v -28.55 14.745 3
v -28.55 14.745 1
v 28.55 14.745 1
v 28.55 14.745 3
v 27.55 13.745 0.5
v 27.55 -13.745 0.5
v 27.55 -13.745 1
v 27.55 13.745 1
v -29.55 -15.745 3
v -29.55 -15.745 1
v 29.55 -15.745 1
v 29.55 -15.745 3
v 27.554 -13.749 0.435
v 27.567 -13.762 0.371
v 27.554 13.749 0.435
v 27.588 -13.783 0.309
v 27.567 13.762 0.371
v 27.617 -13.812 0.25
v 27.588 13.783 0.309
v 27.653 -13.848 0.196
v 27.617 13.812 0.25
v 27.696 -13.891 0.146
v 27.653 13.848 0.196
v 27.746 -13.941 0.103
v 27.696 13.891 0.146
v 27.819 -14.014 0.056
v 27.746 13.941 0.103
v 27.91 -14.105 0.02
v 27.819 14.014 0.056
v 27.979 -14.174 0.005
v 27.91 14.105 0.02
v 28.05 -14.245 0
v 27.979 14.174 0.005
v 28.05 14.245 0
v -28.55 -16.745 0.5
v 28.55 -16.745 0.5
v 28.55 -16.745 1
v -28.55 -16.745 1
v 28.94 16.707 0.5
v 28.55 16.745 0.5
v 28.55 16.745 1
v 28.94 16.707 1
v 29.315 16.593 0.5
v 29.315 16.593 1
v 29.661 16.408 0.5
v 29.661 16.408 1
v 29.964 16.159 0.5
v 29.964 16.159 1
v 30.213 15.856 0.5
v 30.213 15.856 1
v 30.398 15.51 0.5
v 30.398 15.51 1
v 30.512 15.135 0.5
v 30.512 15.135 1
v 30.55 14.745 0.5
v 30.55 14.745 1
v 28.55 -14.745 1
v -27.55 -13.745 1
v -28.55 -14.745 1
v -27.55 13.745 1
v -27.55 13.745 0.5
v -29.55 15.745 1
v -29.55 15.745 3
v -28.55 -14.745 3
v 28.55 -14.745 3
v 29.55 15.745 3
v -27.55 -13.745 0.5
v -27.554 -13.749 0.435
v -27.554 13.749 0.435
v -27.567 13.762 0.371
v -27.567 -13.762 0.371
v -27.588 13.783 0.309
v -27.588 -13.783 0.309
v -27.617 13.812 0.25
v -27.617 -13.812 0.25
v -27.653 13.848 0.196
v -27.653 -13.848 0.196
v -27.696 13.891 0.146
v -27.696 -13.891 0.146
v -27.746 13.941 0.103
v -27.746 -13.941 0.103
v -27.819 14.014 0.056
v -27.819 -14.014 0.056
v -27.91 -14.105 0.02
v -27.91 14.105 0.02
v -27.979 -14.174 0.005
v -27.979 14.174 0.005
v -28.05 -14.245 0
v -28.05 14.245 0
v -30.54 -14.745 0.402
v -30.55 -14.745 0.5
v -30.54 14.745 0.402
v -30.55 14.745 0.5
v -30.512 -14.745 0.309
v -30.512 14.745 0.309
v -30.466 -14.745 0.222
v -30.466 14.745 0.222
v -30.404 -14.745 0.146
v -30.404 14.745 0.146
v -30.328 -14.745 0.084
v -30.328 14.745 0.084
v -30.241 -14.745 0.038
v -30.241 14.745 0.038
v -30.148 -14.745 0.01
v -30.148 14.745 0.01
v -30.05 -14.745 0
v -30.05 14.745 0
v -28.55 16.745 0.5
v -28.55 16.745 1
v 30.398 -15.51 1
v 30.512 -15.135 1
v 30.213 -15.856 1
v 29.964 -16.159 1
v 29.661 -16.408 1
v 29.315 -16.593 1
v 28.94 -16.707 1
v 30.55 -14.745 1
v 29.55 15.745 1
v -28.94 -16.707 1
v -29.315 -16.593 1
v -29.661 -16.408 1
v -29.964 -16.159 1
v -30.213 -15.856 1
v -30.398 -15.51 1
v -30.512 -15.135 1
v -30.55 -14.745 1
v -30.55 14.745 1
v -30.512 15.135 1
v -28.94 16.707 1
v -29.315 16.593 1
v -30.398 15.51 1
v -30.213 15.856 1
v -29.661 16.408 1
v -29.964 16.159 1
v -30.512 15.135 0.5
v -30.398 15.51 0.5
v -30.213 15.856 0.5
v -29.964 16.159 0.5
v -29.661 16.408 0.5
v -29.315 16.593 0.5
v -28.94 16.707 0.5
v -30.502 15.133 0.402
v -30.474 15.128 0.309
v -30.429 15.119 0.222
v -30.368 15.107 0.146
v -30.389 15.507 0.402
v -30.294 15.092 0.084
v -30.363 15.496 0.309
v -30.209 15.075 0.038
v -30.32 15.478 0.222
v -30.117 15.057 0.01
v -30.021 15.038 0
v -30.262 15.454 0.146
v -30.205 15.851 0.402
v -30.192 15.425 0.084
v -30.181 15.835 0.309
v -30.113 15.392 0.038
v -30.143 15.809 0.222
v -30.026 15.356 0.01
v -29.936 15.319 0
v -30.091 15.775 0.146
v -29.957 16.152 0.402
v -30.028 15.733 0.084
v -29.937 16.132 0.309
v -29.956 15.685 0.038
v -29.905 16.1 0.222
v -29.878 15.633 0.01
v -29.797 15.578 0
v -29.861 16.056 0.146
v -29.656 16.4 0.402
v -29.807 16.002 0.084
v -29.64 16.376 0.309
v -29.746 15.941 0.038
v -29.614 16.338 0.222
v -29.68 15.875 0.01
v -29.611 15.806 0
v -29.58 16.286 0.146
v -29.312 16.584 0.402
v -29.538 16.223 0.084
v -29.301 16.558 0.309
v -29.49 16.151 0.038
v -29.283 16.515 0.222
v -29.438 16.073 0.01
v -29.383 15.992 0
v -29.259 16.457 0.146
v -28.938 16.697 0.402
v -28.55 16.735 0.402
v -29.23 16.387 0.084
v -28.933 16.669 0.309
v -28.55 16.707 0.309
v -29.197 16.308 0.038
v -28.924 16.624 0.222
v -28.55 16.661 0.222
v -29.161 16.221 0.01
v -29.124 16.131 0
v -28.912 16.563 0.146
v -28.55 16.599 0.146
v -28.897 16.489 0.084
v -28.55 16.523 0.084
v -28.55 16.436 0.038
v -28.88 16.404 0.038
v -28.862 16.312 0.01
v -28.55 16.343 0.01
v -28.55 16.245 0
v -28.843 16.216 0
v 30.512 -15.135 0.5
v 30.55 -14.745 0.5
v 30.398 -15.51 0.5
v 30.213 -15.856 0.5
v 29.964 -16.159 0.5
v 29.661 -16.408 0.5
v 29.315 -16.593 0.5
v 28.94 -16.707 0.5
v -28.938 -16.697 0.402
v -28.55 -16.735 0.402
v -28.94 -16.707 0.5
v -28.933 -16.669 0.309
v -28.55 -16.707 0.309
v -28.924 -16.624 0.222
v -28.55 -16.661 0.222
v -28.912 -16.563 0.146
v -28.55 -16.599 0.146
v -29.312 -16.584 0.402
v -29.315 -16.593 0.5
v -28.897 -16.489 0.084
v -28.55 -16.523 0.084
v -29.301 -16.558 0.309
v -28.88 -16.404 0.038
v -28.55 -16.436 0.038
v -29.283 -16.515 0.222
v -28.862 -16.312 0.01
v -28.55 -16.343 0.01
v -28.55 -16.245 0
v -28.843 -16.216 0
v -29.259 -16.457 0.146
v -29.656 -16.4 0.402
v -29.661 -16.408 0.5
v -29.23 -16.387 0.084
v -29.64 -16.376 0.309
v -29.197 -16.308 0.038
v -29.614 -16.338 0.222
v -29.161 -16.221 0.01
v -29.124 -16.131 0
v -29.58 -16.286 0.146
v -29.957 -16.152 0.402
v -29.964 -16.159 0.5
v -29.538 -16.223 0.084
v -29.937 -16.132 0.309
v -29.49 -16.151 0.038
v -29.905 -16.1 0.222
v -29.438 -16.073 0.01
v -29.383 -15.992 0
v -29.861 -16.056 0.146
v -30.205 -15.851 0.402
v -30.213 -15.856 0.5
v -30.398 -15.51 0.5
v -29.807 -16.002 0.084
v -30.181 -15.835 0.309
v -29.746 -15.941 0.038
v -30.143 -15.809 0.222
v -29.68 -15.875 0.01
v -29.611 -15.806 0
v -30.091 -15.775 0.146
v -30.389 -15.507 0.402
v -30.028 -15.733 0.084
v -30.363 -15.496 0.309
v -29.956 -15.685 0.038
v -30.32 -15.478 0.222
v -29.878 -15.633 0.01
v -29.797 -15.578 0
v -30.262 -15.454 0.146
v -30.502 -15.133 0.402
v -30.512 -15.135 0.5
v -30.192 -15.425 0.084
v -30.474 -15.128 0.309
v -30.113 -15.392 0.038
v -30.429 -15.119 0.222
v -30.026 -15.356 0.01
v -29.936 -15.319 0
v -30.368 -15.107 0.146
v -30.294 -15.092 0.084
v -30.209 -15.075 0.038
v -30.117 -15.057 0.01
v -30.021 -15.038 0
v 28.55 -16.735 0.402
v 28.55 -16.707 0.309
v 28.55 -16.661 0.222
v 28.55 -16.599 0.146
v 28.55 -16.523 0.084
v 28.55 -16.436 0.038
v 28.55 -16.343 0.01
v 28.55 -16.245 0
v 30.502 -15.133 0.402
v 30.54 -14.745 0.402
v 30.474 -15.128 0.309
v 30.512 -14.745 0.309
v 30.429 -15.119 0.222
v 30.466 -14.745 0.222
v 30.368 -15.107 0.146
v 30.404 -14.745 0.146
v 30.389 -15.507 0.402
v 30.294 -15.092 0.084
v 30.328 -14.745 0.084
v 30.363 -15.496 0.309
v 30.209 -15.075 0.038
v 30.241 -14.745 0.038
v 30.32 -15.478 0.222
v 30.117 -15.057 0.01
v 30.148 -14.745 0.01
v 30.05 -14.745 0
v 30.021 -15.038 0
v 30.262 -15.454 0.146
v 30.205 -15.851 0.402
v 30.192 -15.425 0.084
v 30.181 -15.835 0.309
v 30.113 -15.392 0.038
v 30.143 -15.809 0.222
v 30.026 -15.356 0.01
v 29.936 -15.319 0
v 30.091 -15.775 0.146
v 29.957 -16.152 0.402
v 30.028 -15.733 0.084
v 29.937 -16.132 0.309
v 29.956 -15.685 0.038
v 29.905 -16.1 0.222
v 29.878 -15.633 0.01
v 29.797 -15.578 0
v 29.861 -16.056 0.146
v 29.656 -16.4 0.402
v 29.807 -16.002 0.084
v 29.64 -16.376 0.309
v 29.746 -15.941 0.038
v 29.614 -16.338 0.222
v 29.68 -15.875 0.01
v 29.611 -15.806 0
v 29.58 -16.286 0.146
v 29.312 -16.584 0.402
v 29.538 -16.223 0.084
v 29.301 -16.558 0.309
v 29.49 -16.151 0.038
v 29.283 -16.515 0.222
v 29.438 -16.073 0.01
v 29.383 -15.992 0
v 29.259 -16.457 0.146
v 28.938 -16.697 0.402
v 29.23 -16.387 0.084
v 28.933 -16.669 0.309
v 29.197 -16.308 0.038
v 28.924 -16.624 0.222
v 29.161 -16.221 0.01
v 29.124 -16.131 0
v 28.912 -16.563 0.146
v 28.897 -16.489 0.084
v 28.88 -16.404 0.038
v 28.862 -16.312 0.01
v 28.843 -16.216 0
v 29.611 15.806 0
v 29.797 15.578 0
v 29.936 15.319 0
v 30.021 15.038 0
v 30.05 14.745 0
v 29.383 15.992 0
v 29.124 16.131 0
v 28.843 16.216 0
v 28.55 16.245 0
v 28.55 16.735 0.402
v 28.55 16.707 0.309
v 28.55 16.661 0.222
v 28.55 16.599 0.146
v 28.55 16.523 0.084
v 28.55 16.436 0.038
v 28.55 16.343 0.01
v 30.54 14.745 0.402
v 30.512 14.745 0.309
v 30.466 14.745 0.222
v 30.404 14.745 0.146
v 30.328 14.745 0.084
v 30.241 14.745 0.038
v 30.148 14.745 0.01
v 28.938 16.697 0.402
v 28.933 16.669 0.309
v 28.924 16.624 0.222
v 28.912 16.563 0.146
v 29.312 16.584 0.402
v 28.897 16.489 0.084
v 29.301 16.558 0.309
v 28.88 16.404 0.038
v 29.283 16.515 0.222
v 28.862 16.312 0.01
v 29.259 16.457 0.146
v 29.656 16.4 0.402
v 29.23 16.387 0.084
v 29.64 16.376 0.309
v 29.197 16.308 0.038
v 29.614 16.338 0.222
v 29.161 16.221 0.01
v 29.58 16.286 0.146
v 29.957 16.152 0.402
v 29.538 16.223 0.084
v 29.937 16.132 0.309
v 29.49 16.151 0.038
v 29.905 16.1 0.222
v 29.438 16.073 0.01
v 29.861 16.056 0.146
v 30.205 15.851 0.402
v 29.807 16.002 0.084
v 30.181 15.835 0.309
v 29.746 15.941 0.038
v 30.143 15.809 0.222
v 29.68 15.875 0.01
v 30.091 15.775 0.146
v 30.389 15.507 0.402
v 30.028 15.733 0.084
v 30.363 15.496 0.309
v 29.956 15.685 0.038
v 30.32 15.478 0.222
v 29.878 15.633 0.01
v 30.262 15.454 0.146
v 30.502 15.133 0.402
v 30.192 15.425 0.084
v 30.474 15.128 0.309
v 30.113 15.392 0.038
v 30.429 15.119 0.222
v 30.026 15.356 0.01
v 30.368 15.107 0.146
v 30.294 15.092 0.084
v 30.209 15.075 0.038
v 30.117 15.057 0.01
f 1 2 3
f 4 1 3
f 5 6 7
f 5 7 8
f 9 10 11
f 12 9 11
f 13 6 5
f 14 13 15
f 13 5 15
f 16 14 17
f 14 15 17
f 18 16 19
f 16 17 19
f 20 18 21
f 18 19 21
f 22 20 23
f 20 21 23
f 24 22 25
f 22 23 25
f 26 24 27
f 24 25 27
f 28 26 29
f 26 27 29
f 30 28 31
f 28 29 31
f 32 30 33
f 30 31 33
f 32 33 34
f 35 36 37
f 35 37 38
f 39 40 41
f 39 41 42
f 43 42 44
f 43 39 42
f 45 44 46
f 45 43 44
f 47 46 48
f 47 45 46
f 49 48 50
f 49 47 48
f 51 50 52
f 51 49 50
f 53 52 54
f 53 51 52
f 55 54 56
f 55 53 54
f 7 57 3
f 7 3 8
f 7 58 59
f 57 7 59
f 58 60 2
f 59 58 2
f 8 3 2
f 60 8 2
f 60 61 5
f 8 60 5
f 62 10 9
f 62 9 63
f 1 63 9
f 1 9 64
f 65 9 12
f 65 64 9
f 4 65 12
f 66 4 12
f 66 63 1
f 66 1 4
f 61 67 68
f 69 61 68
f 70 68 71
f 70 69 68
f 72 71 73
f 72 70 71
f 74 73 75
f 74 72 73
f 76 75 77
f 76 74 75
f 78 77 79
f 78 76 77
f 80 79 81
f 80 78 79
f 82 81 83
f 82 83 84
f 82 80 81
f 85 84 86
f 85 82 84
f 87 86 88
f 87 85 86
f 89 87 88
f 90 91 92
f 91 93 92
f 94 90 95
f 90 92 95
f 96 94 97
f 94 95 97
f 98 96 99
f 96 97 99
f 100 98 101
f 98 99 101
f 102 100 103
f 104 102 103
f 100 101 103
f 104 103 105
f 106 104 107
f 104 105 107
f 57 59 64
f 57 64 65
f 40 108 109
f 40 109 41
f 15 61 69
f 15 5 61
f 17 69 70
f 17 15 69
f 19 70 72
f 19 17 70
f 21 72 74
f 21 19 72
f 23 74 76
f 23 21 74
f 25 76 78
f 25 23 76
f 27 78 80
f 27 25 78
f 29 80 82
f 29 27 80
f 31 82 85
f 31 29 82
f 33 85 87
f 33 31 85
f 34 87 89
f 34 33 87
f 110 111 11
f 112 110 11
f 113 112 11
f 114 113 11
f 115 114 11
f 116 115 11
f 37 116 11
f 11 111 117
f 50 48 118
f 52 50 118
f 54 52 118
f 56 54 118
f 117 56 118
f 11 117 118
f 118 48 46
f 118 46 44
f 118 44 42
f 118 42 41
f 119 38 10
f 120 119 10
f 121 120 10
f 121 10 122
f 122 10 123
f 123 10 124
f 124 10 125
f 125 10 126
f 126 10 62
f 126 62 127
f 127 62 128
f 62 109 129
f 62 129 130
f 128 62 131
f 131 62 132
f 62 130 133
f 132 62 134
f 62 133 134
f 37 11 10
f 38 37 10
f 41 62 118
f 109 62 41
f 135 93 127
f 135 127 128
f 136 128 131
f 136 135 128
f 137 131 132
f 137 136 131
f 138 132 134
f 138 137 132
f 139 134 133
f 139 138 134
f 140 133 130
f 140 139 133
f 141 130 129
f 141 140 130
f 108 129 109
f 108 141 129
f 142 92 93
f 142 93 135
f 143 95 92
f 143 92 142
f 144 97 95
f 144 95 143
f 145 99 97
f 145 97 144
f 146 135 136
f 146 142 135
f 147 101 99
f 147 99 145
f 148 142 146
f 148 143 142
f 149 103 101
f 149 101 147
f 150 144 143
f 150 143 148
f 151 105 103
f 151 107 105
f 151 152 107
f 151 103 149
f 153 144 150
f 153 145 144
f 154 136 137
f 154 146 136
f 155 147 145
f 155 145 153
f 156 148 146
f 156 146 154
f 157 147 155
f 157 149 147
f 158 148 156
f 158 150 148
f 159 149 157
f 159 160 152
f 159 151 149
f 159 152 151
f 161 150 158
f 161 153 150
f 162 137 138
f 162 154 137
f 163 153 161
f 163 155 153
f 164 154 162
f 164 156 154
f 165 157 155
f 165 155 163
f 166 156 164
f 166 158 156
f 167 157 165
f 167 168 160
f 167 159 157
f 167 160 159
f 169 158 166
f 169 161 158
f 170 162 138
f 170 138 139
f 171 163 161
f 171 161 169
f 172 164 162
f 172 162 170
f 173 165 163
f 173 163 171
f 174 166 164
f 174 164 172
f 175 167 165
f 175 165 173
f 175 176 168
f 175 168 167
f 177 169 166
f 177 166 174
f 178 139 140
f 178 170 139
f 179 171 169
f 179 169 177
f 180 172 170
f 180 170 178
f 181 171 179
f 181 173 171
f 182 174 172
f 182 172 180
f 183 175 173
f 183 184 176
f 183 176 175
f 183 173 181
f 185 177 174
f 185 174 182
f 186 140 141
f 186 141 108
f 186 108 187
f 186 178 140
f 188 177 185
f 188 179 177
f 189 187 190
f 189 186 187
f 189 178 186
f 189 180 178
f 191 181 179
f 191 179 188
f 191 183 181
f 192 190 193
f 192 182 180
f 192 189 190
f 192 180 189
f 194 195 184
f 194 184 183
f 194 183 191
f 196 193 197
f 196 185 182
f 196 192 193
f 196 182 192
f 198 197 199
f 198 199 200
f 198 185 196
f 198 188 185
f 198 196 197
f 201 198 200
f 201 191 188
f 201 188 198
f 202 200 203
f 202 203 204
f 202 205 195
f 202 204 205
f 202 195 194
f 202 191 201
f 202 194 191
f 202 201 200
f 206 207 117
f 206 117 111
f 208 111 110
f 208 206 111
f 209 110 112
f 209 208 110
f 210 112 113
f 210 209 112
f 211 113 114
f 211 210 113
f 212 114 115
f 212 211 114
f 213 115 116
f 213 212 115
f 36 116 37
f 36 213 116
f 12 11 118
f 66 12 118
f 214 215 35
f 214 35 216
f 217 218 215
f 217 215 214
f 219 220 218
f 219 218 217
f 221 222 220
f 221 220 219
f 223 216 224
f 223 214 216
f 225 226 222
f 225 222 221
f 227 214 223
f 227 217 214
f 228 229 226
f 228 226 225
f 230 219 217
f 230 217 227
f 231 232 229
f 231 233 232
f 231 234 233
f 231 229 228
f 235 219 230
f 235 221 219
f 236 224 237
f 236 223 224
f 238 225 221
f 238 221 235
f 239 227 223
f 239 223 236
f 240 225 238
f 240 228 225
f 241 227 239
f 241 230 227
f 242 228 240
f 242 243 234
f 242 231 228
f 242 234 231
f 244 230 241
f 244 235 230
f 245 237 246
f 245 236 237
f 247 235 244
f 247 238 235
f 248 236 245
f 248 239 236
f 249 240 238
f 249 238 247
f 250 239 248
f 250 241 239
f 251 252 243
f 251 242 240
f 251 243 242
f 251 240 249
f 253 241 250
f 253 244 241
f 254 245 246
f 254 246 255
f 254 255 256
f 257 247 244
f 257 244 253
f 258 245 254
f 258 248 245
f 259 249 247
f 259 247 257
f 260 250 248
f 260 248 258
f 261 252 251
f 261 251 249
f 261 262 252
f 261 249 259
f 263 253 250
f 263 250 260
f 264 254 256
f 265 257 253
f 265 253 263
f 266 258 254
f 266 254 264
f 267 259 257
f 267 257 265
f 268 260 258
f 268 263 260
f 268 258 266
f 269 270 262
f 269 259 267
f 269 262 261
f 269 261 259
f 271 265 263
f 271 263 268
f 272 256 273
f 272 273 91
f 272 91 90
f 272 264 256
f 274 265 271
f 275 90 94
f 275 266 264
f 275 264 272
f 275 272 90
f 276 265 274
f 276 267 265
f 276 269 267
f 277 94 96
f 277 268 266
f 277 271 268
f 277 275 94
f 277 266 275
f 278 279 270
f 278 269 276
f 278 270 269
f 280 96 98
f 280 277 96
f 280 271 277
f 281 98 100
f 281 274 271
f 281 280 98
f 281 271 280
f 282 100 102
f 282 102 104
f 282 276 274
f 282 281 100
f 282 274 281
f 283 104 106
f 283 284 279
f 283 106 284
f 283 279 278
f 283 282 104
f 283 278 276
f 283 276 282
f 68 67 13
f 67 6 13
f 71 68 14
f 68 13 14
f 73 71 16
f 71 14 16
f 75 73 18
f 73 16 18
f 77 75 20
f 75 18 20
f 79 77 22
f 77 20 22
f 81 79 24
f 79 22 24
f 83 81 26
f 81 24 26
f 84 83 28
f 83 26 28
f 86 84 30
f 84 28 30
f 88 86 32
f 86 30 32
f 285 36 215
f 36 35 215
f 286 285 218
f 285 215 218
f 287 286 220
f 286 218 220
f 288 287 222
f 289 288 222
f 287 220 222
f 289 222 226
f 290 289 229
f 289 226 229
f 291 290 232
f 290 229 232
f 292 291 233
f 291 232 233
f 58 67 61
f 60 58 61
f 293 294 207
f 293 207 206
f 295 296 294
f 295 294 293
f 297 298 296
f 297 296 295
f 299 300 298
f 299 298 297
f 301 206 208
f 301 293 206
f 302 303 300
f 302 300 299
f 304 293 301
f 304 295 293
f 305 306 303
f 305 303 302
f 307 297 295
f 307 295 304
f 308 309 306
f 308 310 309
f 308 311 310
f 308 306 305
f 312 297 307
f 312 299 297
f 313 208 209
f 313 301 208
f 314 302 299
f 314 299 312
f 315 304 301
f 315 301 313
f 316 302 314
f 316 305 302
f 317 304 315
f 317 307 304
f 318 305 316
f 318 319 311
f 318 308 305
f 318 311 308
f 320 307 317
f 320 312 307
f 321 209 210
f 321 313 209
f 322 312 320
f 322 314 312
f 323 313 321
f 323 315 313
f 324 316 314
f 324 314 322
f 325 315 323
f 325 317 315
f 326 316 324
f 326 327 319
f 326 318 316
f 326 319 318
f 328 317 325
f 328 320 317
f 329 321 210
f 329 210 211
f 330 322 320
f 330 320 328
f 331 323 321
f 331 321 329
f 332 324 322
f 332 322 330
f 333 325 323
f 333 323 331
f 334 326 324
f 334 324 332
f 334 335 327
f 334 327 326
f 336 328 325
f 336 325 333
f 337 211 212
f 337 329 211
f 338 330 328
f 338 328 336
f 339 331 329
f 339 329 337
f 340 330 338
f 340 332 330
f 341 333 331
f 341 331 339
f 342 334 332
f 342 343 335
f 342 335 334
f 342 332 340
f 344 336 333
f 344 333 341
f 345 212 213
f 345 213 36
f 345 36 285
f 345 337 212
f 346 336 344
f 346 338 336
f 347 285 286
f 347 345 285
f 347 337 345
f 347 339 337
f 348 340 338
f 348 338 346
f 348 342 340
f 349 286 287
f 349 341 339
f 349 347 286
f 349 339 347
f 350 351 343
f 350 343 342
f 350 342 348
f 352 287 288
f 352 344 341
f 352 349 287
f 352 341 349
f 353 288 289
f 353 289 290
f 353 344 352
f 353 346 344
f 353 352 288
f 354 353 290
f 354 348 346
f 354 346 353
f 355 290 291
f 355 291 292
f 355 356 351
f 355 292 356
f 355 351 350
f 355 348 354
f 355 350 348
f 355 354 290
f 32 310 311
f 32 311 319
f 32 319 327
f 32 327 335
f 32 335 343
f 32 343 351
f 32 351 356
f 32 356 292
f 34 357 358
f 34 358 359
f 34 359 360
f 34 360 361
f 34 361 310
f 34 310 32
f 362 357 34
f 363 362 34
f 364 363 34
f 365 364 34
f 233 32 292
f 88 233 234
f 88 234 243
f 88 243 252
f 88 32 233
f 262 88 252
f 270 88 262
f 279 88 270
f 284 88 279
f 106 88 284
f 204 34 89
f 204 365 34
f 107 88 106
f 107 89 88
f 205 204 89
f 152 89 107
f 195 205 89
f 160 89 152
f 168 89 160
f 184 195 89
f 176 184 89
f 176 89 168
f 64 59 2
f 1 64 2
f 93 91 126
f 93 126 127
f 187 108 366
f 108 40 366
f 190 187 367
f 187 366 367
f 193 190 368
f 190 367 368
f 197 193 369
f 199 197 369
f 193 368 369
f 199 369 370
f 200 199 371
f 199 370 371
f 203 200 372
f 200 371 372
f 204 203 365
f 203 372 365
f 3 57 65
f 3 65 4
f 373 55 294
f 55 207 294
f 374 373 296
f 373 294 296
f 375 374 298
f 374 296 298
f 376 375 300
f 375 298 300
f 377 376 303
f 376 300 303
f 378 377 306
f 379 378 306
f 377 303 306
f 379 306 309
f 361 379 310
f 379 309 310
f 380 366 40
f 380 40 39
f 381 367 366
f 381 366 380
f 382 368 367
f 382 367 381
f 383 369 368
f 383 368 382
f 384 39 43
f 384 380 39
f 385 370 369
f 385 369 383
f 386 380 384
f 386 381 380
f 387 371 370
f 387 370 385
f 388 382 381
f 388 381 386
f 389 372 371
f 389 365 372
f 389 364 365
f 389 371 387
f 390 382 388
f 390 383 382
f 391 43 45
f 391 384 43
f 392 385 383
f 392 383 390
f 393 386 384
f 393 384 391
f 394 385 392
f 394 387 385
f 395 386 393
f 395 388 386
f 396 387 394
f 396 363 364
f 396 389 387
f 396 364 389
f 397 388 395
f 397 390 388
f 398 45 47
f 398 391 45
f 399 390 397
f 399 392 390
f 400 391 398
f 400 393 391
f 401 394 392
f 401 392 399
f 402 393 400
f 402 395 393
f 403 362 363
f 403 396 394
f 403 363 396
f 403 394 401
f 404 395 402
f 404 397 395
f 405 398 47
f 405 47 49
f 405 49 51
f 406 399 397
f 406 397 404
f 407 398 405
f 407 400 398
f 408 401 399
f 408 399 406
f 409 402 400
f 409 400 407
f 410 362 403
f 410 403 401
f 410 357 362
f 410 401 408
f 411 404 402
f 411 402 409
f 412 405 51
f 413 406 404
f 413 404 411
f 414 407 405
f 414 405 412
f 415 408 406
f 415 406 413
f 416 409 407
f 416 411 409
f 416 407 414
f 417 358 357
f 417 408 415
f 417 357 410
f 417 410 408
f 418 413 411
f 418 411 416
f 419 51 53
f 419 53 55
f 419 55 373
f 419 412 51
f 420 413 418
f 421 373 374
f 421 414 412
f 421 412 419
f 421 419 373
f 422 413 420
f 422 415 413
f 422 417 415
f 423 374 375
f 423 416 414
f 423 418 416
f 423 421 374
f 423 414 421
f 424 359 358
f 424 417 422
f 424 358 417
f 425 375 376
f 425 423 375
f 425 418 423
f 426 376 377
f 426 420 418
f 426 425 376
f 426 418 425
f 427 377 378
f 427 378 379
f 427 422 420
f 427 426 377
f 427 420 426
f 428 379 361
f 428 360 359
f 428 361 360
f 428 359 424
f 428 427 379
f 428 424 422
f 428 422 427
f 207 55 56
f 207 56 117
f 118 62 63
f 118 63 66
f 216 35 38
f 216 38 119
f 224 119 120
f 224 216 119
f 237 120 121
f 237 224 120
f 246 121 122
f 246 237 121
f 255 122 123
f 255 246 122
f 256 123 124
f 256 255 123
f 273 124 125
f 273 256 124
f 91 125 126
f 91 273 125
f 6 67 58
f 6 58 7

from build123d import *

# Parameters (mm, degrees)
SKETCH1_W           = 55.1
SKETCH1_H           = 27.49
BOSS_EXTRUDE1_DEPTH = 1
FILLET2_R           = 0.5
SKETCH3_W           = 59.1
SKETCH3_H           = 31.49
SKETCH3_W_2         = 57.1
SKETCH3_H_2         = 29.49
BOSS_EXTRUDE2_DEPTH = 2


with BuildPart() as part:
    # Sketch1 → Boss-Extrude1 (new body)
    with BuildSketch(Plane.XY):
        with BuildLine():
            Line((-28.55, 16.745), (28.55, 16.745))
            ThreePointArc((28.55, 16.745), (29.964213562, 16.159213562), (30.55, 14.745))
            Line((30.55, 14.745), (30.55, -14.745))
            ThreePointArc((30.55, -14.745), (29.964213562, -16.159213562), (28.55, -16.745))
            Line((28.55, -16.745), (-28.55, -16.745))
            ThreePointArc((-28.55, -16.745), (-29.964213562, -16.159213562), (-30.55, -14.745))
            Line((-30.55, -14.745), (-30.55, 14.745))
            ThreePointArc((-30.55, 14.745), (-29.964213562, 16.159213562), (-28.55, 16.745))
        make_face()
        Rectangle(SKETCH1_W, SKETCH1_H, mode=Mode.SUBTRACT)
    extrude(amount=BOSS_EXTRUDE1_DEPTH)

    # Fillet2
    fillet2_edges = [part.edges().sort_by_distance(p)[0] for p in [
        (0, 16.745, 0),
        (29.964213562, 16.159213562, 0),
        (30.55, 0, 0),
        (29.964213562, -16.159213562, 0),
        (27.55, 0, 0),
        (0, 13.745, 0),
        (-27.55, 0, 0),
        (0, -13.745, 0),
        (0, -16.745, 0),
        (-29.964213562, -16.159213562, 0),
        (-30.55, 0, 0),
        (-29.964213562, 16.159213562, 0),
    ]]
    fillet(fillet2_edges, radius=FILLET2_R)

    # Sketch3 → Boss-Extrude2 (add)
    with BuildSketch(Plane.XY.offset(1)):
        Rectangle(SKETCH3_W, SKETCH3_H)
        Rectangle(SKETCH3_W_2, SKETCH3_H_2, mode=Mode.SUBTRACT)
    extrude(amount=BOSS_EXTRUDE2_DEPTH)


solid = part.part
